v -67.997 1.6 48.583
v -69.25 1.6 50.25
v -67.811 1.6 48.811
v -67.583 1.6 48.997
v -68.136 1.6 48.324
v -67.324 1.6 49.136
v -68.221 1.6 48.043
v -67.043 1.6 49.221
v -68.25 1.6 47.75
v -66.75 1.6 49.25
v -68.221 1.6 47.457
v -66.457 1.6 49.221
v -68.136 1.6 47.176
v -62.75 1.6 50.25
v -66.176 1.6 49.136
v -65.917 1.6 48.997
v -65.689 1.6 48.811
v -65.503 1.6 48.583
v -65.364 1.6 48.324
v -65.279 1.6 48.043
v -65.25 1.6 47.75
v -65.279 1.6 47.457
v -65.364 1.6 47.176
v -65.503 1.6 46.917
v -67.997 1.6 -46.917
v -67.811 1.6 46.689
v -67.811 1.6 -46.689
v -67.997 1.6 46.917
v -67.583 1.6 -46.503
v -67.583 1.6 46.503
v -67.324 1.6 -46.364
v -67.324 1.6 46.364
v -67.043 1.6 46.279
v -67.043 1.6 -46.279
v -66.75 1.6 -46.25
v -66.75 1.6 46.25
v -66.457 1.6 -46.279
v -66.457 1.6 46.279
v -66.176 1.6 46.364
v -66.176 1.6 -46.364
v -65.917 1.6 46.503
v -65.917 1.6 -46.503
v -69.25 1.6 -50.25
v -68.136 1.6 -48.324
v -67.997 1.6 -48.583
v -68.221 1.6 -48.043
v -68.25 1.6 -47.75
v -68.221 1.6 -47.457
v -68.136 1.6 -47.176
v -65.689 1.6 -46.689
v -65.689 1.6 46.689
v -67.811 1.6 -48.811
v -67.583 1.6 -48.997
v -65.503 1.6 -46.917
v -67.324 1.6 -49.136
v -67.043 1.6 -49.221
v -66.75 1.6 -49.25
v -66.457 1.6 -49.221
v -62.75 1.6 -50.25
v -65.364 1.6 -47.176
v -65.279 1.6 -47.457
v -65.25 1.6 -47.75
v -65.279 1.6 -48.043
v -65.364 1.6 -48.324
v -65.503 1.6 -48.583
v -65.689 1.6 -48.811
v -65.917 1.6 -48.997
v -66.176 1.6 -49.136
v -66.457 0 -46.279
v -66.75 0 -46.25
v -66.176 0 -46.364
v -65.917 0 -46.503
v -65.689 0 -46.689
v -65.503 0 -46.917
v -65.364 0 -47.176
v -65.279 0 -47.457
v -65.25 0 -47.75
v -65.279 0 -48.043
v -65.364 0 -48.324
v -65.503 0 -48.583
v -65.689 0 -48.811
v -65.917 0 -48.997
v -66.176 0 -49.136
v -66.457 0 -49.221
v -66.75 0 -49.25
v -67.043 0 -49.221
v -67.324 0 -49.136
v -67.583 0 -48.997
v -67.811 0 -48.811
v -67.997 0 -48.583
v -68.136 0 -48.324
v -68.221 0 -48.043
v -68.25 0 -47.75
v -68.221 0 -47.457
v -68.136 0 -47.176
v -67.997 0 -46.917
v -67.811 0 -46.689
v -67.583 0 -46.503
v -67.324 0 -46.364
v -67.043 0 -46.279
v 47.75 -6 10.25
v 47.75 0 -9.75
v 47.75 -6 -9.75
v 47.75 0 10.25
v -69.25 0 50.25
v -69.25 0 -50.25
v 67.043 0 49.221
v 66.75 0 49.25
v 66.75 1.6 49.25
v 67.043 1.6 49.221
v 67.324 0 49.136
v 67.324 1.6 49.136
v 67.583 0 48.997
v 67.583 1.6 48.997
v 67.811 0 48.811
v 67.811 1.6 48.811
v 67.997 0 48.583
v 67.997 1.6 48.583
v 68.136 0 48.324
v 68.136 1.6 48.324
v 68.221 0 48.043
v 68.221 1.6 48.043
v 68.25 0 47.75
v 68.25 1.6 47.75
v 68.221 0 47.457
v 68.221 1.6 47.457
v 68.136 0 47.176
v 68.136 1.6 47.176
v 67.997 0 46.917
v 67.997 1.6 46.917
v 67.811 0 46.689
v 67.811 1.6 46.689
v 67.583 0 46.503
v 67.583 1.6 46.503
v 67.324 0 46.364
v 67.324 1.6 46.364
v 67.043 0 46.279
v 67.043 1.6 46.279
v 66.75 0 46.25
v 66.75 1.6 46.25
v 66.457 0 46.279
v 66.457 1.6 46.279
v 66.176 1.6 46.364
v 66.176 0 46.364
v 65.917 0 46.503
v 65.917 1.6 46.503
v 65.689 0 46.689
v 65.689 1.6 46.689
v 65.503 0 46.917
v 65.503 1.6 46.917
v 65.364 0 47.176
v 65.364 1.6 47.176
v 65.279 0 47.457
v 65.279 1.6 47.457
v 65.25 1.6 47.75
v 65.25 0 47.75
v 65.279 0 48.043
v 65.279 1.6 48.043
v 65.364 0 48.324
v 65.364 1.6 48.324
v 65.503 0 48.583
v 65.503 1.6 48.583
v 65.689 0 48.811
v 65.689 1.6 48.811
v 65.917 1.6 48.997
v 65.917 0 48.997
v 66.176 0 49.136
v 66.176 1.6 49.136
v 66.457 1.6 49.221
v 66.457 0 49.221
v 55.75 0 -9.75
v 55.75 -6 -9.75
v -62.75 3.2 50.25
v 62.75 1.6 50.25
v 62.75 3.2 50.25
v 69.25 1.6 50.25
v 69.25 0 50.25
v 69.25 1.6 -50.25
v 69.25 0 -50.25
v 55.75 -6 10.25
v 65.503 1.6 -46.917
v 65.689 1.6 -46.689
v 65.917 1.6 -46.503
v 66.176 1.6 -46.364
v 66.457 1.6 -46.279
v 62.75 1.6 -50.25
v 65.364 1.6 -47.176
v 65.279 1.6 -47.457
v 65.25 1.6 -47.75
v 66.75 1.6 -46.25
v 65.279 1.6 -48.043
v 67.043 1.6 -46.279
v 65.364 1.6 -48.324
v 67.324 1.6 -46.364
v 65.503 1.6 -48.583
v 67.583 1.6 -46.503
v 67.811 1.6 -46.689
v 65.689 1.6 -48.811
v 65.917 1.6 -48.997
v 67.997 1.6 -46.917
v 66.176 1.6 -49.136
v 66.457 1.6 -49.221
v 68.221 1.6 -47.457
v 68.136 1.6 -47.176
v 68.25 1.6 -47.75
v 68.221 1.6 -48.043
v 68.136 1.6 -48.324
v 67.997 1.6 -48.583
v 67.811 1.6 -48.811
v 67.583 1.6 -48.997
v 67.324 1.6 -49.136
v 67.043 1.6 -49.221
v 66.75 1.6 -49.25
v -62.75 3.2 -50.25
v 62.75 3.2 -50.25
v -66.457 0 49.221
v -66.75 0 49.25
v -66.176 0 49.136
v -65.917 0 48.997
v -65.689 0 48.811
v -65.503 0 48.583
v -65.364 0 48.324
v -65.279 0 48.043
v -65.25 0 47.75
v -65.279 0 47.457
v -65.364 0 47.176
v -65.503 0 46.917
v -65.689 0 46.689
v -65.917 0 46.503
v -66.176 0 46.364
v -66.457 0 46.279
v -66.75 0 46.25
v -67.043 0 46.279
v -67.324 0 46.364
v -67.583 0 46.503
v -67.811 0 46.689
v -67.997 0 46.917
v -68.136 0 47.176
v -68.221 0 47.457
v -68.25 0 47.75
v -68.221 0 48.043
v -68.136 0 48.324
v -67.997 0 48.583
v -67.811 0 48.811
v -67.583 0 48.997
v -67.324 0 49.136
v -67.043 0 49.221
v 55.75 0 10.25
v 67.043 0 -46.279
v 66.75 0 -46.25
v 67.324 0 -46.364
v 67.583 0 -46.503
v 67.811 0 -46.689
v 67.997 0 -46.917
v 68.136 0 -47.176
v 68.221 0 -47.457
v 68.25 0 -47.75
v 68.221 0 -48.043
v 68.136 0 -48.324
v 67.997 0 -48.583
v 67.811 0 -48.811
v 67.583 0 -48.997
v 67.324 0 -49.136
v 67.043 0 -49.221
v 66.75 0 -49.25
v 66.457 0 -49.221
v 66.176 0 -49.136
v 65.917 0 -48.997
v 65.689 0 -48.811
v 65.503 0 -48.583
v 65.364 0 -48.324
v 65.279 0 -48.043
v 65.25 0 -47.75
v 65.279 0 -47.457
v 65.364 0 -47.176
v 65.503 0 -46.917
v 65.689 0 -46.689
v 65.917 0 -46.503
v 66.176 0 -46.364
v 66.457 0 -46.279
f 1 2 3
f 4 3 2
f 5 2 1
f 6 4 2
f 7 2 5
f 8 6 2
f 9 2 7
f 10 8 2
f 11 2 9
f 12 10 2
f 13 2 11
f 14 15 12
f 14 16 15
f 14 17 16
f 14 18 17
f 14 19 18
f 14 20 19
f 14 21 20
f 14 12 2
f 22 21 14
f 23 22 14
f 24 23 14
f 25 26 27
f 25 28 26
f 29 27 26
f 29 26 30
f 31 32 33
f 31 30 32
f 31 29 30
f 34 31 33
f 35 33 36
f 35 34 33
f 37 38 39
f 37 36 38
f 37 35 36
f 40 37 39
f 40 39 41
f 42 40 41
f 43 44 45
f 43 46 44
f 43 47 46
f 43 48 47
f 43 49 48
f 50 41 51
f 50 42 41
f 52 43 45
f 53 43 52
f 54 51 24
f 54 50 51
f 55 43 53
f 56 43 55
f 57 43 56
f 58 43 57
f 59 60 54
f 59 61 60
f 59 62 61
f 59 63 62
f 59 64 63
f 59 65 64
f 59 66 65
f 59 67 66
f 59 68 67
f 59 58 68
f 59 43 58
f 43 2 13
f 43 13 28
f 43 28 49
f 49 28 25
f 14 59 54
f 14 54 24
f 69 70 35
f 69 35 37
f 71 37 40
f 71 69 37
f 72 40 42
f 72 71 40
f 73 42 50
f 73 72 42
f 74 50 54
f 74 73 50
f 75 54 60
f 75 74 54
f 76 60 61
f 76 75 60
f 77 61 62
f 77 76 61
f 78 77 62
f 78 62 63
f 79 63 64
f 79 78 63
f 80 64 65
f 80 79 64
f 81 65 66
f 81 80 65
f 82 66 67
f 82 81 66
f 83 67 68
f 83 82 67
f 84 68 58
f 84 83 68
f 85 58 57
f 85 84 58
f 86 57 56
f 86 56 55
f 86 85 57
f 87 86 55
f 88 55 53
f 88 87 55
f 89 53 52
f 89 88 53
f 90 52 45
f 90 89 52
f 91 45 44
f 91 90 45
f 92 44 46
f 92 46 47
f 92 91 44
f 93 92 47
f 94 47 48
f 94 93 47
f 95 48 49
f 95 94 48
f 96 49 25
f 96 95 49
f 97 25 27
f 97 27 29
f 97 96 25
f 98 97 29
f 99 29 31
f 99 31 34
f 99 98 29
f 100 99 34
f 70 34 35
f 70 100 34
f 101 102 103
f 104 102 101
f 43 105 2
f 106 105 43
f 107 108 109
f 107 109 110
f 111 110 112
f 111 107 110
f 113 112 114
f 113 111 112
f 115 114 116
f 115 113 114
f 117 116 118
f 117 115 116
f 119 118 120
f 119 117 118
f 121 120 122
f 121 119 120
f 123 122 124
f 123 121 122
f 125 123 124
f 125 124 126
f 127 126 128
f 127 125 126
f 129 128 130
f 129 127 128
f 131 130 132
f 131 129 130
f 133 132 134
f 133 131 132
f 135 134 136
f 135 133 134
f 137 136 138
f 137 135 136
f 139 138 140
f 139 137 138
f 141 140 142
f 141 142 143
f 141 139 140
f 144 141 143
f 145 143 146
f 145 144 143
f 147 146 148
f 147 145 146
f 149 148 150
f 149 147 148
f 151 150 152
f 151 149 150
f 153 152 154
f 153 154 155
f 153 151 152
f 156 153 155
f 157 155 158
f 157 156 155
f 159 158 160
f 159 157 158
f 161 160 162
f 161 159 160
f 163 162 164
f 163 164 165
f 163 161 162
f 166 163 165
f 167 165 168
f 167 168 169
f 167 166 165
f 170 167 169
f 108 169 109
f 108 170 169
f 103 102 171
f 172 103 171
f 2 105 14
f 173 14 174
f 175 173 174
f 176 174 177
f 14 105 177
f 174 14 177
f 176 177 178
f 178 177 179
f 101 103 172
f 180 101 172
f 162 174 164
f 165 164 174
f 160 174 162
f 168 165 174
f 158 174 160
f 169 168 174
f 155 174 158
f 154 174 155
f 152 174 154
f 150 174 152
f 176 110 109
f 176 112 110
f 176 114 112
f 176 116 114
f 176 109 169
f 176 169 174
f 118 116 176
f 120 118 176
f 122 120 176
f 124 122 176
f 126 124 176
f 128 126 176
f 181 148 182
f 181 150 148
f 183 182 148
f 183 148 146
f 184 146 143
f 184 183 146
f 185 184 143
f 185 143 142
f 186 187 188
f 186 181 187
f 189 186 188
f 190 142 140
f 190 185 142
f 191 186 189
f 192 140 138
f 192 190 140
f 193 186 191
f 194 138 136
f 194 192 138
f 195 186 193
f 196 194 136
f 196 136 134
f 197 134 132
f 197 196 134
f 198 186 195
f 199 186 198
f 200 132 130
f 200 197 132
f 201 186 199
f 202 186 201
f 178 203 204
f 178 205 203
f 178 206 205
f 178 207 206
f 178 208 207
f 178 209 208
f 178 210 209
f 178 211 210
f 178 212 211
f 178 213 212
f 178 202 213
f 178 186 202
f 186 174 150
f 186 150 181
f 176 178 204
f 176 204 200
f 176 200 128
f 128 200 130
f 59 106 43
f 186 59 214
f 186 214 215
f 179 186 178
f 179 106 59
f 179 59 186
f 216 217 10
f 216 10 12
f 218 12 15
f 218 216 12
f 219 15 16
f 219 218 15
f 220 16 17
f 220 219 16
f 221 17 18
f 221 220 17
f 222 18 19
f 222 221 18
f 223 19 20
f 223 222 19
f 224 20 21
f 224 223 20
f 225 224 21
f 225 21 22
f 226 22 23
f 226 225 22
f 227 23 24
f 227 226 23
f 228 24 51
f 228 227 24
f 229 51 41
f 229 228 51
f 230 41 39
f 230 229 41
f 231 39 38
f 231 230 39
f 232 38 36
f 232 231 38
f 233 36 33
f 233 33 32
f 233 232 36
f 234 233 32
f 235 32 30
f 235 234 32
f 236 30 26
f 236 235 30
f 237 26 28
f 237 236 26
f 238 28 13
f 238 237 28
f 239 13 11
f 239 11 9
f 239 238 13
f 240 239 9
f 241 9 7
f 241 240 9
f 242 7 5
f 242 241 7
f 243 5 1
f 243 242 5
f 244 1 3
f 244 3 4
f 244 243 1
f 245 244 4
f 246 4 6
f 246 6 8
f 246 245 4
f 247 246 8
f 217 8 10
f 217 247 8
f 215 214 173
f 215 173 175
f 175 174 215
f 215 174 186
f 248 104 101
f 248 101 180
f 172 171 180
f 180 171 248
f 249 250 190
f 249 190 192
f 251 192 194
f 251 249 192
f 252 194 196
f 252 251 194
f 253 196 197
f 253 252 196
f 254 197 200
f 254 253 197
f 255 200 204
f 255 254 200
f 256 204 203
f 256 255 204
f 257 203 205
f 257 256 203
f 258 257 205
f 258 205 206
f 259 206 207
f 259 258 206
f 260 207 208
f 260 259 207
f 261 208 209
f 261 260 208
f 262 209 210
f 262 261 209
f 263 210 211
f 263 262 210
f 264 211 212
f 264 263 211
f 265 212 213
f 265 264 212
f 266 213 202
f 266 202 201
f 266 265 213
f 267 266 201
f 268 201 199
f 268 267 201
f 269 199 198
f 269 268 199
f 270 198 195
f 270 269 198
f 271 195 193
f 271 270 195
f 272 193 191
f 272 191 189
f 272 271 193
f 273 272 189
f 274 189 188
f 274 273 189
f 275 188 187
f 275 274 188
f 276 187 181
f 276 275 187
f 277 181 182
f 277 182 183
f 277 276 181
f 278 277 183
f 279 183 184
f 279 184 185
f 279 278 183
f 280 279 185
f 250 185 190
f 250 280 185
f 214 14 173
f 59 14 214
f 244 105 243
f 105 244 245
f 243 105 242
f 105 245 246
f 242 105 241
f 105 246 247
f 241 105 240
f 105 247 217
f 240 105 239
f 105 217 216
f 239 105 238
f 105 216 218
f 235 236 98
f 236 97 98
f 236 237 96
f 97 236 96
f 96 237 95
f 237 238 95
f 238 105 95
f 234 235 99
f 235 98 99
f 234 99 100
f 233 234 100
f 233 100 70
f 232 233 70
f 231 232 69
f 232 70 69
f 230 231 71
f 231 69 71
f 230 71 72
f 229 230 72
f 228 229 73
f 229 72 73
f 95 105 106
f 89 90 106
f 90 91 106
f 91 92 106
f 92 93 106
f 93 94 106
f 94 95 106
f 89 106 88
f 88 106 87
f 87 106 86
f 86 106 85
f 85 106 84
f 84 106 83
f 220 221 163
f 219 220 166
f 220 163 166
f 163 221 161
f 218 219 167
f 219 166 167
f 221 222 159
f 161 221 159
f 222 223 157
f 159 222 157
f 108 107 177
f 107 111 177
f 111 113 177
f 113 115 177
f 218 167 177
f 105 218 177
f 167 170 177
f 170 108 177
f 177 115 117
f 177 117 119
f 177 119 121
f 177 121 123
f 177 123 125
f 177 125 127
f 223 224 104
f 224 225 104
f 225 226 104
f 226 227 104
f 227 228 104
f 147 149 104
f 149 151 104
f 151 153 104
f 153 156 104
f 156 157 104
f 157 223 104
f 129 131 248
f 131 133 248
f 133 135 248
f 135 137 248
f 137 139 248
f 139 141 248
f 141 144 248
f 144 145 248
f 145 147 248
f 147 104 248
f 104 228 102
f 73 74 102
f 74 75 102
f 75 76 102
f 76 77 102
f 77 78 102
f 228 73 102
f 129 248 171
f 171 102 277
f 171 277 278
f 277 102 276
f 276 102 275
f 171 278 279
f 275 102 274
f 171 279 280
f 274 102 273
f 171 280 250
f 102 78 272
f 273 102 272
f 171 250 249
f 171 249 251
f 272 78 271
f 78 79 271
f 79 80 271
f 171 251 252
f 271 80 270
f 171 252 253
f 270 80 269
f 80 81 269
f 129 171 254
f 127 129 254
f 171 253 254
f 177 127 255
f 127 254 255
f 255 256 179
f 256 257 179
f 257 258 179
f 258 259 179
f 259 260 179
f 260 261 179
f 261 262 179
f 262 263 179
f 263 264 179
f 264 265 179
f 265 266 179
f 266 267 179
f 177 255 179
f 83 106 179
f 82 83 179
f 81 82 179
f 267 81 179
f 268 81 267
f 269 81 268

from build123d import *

# Parameters (mm, degrees)
SKETCH1_W           = 138.5
SKETCH1_H           = 100.5
SKETCH1_R           = 1.5
BOSS_EXTRUDE1_DEPTH = 1.6
SKETCH2_W           = 125.5
SKETCH2_H           = 100.5
BOSS_EXTRUDE2_DEPTH = 1.6
SKETCH3_W           = 8
SKETCH3_H           = 20
BOSS_EXTRUDE3_DEPTH = 6


with BuildPart() as part:
    # Sketch1 → Boss-Extrude1 (new body)
    with BuildSketch(Plane(origin=(0, 0, 0), x_dir=(1, 0, 0), z_dir=(0, 1, 0))):
        Rectangle(SKETCH1_W, SKETCH1_H)
        with Locations(Location((-66.75, 47.75, 0), (0, 0, 270))):
            Circle(SKETCH1_R, mode=Mode.SUBTRACT)
        with Locations(Location((66.75, 47.75, 0), (0, 0, 270))):
            Circle(SKETCH1_R, mode=Mode.SUBTRACT)
        with Locations(Location((66.75, -47.75, 0), (0, 0, 270))):
            Circle(SKETCH1_R, mode=Mode.SUBTRACT)
        with Locations(Location((-66.75, -47.75, 0), (0, 0, 270))):
            Circle(SKETCH1_R, mode=Mode.SUBTRACT)
    extrude(amount=BOSS_EXTRUDE1_DEPTH)

    # Sketch2 → Boss-Extrude2 (add)
    with BuildSketch(Plane(origin=(0, 1.6, 0), x_dir=(1, 0, 0), z_dir=(0, 1, 0))):
        Rectangle(SKETCH2_W, SKETCH2_H)
    extrude(amount=BOSS_EXTRUDE2_DEPTH)

    # Sketch3 → Boss-Extrude3 (add)
    with BuildSketch(Plane.XZ):
        with Locations((51.75, 0.25)):
            Rectangle(SKETCH3_W, SKETCH3_H)
    extrude(amount=BOSS_EXTRUDE3_DEPTH)


solid = part.part
